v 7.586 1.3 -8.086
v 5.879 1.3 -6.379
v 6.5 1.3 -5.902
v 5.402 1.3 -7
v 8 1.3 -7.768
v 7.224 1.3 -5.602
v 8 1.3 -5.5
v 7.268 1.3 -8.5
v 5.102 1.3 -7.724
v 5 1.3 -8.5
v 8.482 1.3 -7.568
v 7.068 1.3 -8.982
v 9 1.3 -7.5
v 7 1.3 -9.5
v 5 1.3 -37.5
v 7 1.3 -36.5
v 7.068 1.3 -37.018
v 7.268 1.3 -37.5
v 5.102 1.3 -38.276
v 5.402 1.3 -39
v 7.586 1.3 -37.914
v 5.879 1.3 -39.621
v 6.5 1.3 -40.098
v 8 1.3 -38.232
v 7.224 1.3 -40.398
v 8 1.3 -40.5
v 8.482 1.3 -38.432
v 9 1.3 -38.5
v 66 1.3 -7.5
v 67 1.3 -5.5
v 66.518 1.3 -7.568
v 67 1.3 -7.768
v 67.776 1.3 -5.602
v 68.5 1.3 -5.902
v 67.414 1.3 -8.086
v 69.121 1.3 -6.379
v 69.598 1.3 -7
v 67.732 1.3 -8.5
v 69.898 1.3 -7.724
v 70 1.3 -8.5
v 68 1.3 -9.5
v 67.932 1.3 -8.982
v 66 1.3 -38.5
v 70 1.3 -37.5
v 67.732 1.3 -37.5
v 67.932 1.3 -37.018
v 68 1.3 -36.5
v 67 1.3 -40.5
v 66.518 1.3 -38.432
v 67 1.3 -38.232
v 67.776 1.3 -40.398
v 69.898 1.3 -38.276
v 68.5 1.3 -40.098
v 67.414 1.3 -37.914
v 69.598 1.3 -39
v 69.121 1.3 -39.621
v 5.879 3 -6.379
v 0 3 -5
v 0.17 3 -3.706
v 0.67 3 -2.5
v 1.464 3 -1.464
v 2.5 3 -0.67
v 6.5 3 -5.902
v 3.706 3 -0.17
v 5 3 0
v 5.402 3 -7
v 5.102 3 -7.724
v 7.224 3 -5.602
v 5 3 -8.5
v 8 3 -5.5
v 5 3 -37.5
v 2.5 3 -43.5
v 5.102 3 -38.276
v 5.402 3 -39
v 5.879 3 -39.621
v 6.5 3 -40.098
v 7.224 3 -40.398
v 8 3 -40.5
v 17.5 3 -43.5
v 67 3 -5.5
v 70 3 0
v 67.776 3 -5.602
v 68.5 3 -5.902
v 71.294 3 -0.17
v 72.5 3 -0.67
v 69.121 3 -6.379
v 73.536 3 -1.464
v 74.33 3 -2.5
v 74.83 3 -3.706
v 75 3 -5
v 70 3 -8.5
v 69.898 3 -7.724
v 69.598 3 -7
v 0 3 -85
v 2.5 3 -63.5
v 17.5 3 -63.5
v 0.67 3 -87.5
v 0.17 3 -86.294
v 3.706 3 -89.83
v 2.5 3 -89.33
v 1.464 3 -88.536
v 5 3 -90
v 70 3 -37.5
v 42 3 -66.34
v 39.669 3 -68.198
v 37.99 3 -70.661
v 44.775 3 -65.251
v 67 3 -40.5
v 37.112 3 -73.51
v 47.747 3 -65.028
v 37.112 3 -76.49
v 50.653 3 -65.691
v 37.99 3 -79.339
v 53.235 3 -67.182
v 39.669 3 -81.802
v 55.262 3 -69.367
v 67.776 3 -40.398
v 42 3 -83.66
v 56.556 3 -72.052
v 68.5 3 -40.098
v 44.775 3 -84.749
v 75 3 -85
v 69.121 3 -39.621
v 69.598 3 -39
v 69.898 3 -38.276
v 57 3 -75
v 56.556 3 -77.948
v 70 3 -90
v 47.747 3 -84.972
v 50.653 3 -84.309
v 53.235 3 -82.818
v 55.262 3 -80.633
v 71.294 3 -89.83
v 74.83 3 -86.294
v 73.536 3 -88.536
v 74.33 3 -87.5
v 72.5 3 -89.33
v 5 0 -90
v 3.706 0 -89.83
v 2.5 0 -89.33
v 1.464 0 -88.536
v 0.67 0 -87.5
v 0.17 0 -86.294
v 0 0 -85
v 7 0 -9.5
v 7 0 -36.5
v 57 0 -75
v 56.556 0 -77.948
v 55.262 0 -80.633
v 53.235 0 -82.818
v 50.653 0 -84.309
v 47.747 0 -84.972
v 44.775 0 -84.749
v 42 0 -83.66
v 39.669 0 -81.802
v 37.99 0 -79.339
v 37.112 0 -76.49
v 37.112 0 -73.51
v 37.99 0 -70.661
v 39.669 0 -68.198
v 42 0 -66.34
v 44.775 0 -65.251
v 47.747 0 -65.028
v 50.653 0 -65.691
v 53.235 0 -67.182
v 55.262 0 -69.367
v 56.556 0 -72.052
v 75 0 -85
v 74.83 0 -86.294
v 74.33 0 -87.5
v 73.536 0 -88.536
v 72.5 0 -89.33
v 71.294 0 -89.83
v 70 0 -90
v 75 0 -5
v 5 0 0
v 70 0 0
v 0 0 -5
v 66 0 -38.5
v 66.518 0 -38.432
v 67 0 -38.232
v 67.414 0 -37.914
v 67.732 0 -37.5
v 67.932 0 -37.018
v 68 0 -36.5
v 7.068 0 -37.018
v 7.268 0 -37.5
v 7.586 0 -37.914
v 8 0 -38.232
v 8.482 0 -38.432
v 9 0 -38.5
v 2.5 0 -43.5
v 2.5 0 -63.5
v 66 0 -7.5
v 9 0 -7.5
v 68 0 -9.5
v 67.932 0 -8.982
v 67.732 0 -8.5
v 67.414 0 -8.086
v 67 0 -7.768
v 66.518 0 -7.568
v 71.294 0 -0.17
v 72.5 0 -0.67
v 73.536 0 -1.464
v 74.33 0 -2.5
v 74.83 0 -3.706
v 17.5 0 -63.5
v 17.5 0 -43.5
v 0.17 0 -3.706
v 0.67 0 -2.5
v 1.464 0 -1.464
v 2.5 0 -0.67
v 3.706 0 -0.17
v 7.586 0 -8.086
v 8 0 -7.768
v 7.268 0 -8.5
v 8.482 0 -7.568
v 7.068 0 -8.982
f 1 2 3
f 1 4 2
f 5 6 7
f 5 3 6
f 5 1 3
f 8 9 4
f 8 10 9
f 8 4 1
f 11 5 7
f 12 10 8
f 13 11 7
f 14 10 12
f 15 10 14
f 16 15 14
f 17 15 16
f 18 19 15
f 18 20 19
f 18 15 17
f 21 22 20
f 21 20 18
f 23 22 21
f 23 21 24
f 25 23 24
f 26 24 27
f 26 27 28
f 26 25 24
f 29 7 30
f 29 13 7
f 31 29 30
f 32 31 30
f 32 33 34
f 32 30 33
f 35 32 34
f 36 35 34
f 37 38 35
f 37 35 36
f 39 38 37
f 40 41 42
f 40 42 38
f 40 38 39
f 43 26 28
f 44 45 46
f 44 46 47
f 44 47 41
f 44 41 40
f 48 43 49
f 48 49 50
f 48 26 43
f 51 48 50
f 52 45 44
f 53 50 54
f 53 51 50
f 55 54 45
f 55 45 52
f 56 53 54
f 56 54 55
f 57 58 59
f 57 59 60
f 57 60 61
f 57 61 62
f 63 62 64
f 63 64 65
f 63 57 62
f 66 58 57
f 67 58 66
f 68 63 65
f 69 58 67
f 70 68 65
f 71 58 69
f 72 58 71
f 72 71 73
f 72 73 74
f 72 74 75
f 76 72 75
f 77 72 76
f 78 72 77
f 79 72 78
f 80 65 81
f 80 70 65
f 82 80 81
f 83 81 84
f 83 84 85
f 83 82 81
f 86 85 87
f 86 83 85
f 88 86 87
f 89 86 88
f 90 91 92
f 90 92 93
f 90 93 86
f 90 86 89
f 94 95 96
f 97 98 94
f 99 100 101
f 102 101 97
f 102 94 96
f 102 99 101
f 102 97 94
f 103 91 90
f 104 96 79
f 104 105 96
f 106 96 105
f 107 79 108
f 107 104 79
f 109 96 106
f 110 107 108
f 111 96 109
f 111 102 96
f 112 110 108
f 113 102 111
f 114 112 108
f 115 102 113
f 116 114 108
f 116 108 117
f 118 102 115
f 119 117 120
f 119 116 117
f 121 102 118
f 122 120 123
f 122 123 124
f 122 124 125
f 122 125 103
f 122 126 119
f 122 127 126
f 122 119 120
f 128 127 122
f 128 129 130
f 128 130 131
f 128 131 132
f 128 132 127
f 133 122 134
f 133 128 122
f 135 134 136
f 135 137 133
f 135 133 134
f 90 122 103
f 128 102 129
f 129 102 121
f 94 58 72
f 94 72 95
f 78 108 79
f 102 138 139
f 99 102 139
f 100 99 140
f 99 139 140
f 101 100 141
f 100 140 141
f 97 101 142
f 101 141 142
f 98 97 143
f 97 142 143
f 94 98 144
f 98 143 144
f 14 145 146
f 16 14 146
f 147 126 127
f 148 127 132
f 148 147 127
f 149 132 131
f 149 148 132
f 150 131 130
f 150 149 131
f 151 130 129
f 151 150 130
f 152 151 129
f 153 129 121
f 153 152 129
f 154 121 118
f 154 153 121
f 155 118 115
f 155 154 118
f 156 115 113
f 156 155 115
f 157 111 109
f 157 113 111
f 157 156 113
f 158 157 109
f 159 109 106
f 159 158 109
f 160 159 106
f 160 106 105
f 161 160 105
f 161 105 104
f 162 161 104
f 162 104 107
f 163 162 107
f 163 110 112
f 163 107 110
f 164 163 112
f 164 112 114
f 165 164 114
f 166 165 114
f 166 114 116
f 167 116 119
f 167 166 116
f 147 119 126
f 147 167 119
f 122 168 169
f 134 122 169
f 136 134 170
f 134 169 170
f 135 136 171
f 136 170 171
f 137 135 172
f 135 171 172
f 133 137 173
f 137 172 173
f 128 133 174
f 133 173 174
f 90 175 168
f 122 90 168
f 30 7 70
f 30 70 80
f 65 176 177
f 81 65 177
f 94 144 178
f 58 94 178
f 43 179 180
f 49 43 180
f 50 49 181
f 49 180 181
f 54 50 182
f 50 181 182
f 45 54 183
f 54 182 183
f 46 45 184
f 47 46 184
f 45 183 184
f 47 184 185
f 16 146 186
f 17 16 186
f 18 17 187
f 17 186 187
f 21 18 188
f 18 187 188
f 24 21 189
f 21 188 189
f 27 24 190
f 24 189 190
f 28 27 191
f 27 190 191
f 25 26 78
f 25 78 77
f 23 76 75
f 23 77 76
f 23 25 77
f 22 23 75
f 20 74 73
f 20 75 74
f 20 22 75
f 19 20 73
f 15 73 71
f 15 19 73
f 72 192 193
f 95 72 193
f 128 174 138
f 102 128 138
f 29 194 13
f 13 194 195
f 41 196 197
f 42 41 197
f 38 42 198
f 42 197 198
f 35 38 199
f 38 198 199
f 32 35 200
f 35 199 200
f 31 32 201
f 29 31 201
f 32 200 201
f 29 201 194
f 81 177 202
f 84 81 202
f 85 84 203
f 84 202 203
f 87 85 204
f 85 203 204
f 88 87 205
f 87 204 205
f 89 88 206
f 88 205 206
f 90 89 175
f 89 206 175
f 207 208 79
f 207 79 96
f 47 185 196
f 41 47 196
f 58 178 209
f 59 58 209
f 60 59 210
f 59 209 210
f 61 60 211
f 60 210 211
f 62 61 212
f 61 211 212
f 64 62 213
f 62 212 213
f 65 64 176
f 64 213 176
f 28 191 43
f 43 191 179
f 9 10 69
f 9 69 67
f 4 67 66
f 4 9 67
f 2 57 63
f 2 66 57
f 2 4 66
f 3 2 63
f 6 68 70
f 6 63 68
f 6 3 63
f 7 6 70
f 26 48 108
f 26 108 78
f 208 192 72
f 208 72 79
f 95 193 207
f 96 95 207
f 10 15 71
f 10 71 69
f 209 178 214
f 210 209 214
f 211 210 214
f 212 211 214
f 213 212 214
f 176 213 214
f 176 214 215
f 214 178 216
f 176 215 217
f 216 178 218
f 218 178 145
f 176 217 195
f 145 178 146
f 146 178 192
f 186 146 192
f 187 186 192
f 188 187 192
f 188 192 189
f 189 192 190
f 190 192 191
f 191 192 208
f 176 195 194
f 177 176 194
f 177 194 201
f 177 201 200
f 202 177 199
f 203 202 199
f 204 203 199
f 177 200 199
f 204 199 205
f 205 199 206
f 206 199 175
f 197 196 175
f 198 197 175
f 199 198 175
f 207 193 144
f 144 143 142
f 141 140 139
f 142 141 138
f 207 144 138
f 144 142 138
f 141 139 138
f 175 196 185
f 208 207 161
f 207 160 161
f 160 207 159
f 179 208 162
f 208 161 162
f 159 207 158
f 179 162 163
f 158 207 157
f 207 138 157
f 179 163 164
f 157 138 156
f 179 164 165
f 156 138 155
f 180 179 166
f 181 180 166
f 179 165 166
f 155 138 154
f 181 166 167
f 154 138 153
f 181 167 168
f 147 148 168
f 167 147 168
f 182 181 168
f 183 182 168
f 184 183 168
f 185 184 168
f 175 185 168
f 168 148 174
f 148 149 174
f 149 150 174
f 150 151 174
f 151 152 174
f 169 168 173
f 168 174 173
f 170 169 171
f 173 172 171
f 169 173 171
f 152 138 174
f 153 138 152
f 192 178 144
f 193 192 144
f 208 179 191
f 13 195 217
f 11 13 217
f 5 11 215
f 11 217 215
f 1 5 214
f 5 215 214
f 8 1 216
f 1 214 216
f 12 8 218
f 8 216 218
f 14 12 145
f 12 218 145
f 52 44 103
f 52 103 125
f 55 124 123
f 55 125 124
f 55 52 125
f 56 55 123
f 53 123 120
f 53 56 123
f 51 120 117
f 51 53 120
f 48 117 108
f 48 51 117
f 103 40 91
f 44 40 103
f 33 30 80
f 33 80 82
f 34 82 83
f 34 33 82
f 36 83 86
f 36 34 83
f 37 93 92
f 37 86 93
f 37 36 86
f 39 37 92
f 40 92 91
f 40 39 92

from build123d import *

# Parameters (mm, degrees)
BOSS_EXTRUDE1_DEPTH     = 3
SKETCH2_R               = 10
SKETCH2_W               = 15
SKETCH2_H               = 20
CUT_EXTRUDE4_DEPTH      = 7
CUT_EXTRUDE4_DEPTH_BACK = 3
SKETCH6_W               = 65
SKETCH6_H               = 35
BOSS_EXTRUDE5_DEPTH     = 1.3


with BuildPart() as part:
    # Sketch1 → Boss-Extrude1 (new body)
    with BuildSketch(Plane(origin=(0, 0, 0), x_dir=(1, 0, 0), z_dir=(0, 1, 0))):
        with BuildLine():
            Line((5, 0), (70, 0))
            ThreePointArc((70, 0), (73.535533906, 1.464466094), (75, 5))
            Line((75, 5), (75, 85))
            ThreePointArc((75, 85), (73.535533906, 88.535533906), (70, 90))
            Line((70, 90), (5, 90))
            ThreePointArc((5, 90), (1.464466094, 88.535533906), (0, 85))
            Line((0, 85), (0, 5))
            ThreePointArc((0, 5), (1.464466094, 1.464466094), (5, 0))
        make_face()
    extrude(amount=BOSS_EXTRUDE1_DEPTH)

    # Sketch2 → Cut-Extrude4 (cut, two sides)
    with BuildSketch(Plane(origin=(0, 0, 0), x_dir=(1, 0, 0), z_dir=(0, 1, 0))) as cut_extrude4_sk:
        with Locations((47, 75)):
            Circle(SKETCH2_R)
        with BuildLine():
            Line((8, 5.5), (67, 5.5))
            ThreePointArc((67, 5.5), (69.121320344, 6.378679656), (70, 8.5))
            Line((70, 8.5), (70, 37.5))
            ThreePointArc((70, 37.5), (69.121320344, 39.621320344), (67, 40.5))
            Line((67, 40.5), (8, 40.5))
            ThreePointArc((8, 40.5), (5.878679656, 39.621320344), (5, 37.5))
            Line((5, 37.5), (5, 8.5))
            ThreePointArc((5, 8.5), (5.878679656, 6.378679656), (8, 5.5))
        make_face()
        with Locations((10, 53.5)):
            Rectangle(SKETCH2_W, SKETCH2_H)
    extrude(amount=CUT_EXTRUDE4_DEPTH, mode=Mode.SUBTRACT)
    extrude(cut_extrude4_sk.sketch, amount=-CUT_EXTRUDE4_DEPTH_BACK, mode=Mode.SUBTRACT)

    # Sketch6 → Boss-Extrude5 (add)
    with BuildSketch(Plane(origin=(0, 0, 0), x_dir=(1, 0, 0), z_dir=(0, 1, 0))):
        with Locations((37.5, 23)):
            Rectangle(SKETCH6_W, SKETCH6_H)
        with BuildLine():
            Line((9, 38.5), (66, 38.5))
            ThreePointArc((66, 38.5), (67.414213562, 37.914213562), (68, 36.5))
            Line((68, 36.5), (68, 9.5))
            ThreePointArc((68, 9.5), (67.414213562, 8.085786438), (66, 7.5))
            Line((66, 7.5), (9, 7.5))
            ThreePointArc((9, 7.5), (7.585786438, 8.085786438), (7, 9.5))
            Line((7, 9.5), (7, 36.5))
            ThreePointArc((7, 36.5), (7.585786438, 37.914213562), (9, 38.5))
        make_face(mode=Mode.SUBTRACT)
    extrude(amount=BOSS_EXTRUDE5_DEPTH)


solid = part.part
